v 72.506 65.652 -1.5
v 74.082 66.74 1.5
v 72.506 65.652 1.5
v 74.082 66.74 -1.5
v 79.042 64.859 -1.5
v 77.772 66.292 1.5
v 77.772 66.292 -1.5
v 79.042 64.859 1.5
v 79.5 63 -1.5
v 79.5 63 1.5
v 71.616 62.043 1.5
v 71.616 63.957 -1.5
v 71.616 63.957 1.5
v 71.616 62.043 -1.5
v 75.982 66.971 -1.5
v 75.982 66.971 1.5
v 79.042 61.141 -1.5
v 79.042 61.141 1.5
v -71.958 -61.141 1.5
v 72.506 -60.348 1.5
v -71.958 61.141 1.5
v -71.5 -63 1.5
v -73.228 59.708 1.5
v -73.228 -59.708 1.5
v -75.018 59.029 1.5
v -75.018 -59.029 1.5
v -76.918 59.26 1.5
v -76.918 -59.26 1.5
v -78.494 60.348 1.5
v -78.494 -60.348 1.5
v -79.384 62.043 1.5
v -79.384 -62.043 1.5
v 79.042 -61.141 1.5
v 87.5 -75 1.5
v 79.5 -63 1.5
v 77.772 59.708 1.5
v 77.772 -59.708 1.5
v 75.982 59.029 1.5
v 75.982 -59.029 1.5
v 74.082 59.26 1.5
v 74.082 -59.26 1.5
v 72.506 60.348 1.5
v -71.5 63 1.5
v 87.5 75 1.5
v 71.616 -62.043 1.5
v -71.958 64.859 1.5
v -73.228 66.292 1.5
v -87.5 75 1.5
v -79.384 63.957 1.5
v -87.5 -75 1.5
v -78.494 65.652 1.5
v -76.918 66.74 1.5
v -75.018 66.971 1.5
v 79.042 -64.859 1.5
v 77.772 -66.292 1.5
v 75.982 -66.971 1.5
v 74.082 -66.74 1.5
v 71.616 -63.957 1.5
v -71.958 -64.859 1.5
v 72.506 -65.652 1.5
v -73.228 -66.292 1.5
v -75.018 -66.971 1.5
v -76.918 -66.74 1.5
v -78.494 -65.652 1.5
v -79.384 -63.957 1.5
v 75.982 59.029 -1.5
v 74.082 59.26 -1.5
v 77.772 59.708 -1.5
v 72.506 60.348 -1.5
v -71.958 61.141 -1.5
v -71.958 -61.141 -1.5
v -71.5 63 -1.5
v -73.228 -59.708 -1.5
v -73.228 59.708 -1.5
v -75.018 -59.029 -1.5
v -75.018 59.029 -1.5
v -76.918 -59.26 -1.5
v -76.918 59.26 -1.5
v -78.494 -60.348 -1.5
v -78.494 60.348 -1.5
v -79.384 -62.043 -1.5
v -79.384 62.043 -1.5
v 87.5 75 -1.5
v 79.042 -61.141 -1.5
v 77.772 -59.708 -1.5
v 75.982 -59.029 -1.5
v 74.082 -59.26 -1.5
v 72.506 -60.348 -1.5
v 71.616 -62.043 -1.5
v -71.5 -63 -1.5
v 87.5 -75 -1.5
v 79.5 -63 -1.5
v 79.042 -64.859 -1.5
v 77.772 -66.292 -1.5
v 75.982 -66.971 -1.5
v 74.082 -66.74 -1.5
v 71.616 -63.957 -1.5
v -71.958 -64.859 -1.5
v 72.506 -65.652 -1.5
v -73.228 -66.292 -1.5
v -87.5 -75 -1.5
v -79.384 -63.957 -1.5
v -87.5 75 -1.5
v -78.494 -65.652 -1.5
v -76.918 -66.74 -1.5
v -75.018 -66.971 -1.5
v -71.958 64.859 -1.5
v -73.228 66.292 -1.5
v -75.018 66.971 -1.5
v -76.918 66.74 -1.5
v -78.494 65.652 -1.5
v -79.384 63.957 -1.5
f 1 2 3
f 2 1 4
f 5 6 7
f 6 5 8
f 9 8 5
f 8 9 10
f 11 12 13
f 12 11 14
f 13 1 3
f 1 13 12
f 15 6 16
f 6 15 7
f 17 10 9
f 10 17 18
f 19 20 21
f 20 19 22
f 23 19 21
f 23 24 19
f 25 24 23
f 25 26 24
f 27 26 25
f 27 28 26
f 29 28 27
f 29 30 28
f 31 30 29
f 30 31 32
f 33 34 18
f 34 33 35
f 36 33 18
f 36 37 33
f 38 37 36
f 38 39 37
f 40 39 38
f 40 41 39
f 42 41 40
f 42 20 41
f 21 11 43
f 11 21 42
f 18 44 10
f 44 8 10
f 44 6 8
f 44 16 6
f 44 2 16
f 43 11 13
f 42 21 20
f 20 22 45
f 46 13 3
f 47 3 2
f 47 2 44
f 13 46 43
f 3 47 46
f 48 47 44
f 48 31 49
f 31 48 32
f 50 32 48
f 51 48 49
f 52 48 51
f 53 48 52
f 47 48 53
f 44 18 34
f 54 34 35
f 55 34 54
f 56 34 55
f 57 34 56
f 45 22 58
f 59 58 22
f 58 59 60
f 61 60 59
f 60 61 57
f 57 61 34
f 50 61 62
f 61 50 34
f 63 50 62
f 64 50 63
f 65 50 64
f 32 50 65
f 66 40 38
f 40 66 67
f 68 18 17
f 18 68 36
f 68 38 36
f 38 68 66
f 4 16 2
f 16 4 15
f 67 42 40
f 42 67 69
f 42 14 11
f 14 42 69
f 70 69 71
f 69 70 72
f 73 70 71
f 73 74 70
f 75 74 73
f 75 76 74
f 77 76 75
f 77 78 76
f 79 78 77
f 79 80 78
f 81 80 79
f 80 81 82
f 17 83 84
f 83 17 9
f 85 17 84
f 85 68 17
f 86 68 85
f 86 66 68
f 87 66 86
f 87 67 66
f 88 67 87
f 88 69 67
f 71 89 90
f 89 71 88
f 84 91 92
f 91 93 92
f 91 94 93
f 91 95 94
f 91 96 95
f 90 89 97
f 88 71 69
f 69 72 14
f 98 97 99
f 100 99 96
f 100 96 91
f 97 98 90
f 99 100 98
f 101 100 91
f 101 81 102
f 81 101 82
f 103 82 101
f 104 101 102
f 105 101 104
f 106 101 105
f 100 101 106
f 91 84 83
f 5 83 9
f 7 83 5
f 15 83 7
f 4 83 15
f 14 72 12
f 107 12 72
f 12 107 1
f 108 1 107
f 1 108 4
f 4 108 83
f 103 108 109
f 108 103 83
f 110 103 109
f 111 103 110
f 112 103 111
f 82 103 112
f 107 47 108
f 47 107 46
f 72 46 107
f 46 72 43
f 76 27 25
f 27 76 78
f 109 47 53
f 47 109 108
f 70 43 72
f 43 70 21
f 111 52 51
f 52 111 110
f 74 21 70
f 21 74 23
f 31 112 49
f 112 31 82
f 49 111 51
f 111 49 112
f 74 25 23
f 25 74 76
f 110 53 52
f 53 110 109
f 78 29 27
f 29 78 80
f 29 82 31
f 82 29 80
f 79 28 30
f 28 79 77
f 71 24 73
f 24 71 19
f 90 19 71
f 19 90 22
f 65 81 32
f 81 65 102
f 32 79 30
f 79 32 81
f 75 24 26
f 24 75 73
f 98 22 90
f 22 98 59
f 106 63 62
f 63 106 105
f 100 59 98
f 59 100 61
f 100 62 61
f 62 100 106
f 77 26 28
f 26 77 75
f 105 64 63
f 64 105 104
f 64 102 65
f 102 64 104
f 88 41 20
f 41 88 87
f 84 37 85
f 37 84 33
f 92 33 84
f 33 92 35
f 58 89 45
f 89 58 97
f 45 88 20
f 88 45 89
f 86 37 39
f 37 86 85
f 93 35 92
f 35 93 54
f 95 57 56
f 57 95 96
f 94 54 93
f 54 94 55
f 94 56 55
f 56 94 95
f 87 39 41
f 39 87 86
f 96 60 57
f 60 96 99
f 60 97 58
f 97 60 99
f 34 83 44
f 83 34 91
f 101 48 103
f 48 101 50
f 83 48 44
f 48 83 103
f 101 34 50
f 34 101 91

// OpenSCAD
// Generated by SolidPython 1.1.3 on 2022-12-12 16:11:59


difference() {
	cube(center = true, size = [175, 150, 3]);
	union() {
		translate(v = [75.5000000000, 63.0000000000]) {
			cylinder(center = true, h = 3, r = 4.0000000000);
		}
		translate(v = [-75.5000000000, 63.0000000000]) {
			cylinder(center = true, h = 3, r = 4.0000000000);
		}
		translate(v = [-75.5000000000, -63.0000000000]) {
			cylinder(center = true, h = 3, r = 4.0000000000);
		}
		translate(v = [75.5000000000, -63.0000000000]) {
			cylinder(center = true, h = 3, r = 4.0000000000);
		}
	}
}
/***********************************************
*********      SolidPython code:      **********
************************************************
 
import solid
import pudb
from solid.utils import *
import viewscad
import subprocess
import os
import os.path as osp
import math

chamfer_extrude=solid.import_scad("./chamfer_extrude.scad")
chamfer_extrude=chamfer_extrude.chamfer_extrude
r = viewscad.Renderer(width=800, height=800)

def debug(model,f_name,path="/home/ts/code/projects/mfd/designs/debug"):
    solid.scad_render_to_file(model,osp.join(path,f_name)+".scad")
#generate position list of wells using offset from center
wells_pos_from_center_4 = lambda offset: [[-offset,offset],
                                        [offset, offset],
                                        [-offset, -offset],
                                        [offset, -offset]]
#wells_pos_from_center_2 = lambda offset: [[0,offset],
#                                        [0, -offset]]
wells_pos_from_center_2 = lambda offset: [[offset,0],
                                        [-offset,0]]

def wells_top_bottom(radius,height=None, positions = None, dxf = False):
    if positions is None:
        offset = radius+radius/2.0
        positions = wells_pos_from_center_2(offset)
    if dxf or (height is None):
        height = 0
    wells = []
    for position in positions:
        #make circle if making dxf
        if dxf:
            well_shape = solid.circle(r=radius, segments=64)
            well_shape = solid.translate([position[0],position[1]])(well_shape)
        #if stl make cylinder
        else:
            well_shape = solid.cylinder(r=radius, h=height, segments=64, center = True)
            well_shape = solid.translate([position[0],position[1],height/2.0])(well_shape)
        wells.append(well_shape)
    return  union()(*wells)

#place wells in four corners 
def four_corner(radius,height=None, positions = None, dxf = False):
    #if well pos not specified set
    #to equally spaced by half radius
    if positions is None:
        offset = radius+radius/2.0
        positions = wells_pos_from_center_4(offset)
    if dxf or (height is None):
        height = 0
    #make wells at positions with specified radius and height
    wells = []
    for position in positions:
        #make circle if making dxf
        if dxf:
            well_shape = solid.circle(r=radius, segments=64)
            well_shape = solid.translate([position[0],position[1]])(well_shape)
        #if stl make cylinder
        else:
            well_shape = solid.cylinder(r=radius, h=height, segments=64, center = True)
            well_shape = solid.translate([position[0],position[1],height/2.0])(well_shape)
        wells.append(well_shape)
    return  union()(*wells)

#generate channels 
def make_channels(length,width,height=0,num_chans=1,max_chans=None,spacing=None, dxf = False,
                  rotate_channels=False):
    if dxf or (height is None):
        height = 0
    #if channel gap not defined, is equal to
    if spacing is None: spacing = width
    #calculate number of channels if fitting max num within given width
    if not max_chans is None:
        import math
        num_chans = math.floor((max_chans-spacing)/(width+spacing))
    #get total width of channel section  
    total_width = (width*num_chans)+(spacing*(num_chans-1))

    #make template channel
    #if rotate_channels: width, length = length, width
    if dxf:
        channel_t = solid.square([length,width],center = True)
    else:
        channel_t = solid.cube([length,width,height], center = True)

    #if number channels is even, offset the first channel to center its gap
    if num_chans % 2 == 0: centering = -(width/2.0+spacing/2.0)
    else: centering = 0
    #move template channel up to align bottom at z = 0 
    #and offset center if necessary
    if dxf:
        channel_t = solid.translate([0,centering])(channel_t)
    else:
        channel_t = solid.translate([0,centering,height/2.0])(channel_t)

    #if rotate_channels: length,width = width,length
    #start making the channels
    channels = []
    for i in range(num_chans):
        #if i=0 there is no translation
        #if i=1, we make the first channel adjacent to second
        direction = i

        #if i>=1, we add channels alternating left and right
        if i >= 1:
            direction = -(i/2.0)
            if i % 2 == 1: direction = (-direction)+0.5
                
        #make channel at right position and add it to channel list
        translation_coords = [0,direction*(width+spacing)]
        #if rotate_channels: translation_coords = [direction*(width+spacing),0]
        if dxf:
            channel = solid.translate(translation_coords)(channel_t)
        else:
            channel = solid.translate([*translation_coords,0])(channel_t)
        channels.append(channel)
    
    #group all channels as one object
    channels = union()(*channels)
    #compute the x,y,z dimensions in order to pass as arguments 
    #for construction of other parts of device (such as the chambers)
    measurements = {'x':(length/2.0,-length/2.0),
                    'y':(total_width/2.0,-total_width/2.0)}
    if not dxf:
        measurements['z'] = (height,0)
    if rotate_channels:
        channels = solid.rotate(90)(channels)
        measurements['x'],measurements['y']=measurements['y'],measurements['x']
    return channels,measurements

def make_chambers(msrs,height=None,extra=0,len_until=None,width=None, dxf = False):
    #computes x,y,z length
    total = lambda x : abs(x[0]) + abs(x[1])
    
    #if specific height if specified
    #otherwise use same height as channels
    if dxf:
        pass
    elif not height is None:
        msrs['z'] = (height,0)
    else:
        msrs['z'] = (0,0)
        
    #make copy of measurements from channels to modify chamber dimensions 
    #and add length to chambers as specified
    chamber_dims = msrs.copy()
    #calculate length of chamber to reach specified offset
    if not len_until is None:
        chamber_len = len_until-(msrs['x'][0])
    #or add specified length to channel length (if not specified, adds 0)
    else:
        chamber_len = msrs['x'][0]+extra
    #set the chamber length based 
    chamber_dims['x'] = (chamber_len/2.0,-(chamber_len/2.0))
    #compute final dimensions of chamber
    if not width is None:
        chamber_dims['y'] = (width/2.0,-width/2.0)
    chamber_dims = [total(size) for size in chamber_dims.values()]
        
    #calculate chamber translation offset to place adjacent to channels
    chamber_trslt = msrs['x'][0]+(chamber_len/2.0)
    #compute chamber translation coordinates to align with channels
    #x = 1 moves chamber above channels
    #x = -1 moves chamber below channels
    if dxf:
        trslt = lambda x : [x*(chamber_trslt),0]
    else:
        trslt = lambda x : [x*(chamber_trslt),0,msrs['z'][0]/2.0]
    
    #function to make chamber at top or at bottom 
    if dxf:
        move = lambda x : solid.translate(trslt(x))(solid.square(chamber_dims, center = True) )
    else:
        move = lambda x : solid.translate(trslt(x))(solid.cube(chamber_dims,center = True))
    #make top and bottom chambers and return them as grouped
    top = move(1)
    bottom = move(-1)
    #chambers=solid.rotate(90)(solid.union()(top,bottom))
    chambers=(solid.union()(top,bottom))

    return chambers

#create alignment features 
def alignment_features(unit,dims,grid_size, mask_size = None, alignment = "hollow", units_from_center = (2.5,2.5), corner_len=None):
    width = grid_size[0]*dims[0]
    length = grid_size[1]*dims[1]
    if mask_size is None and corner_len is None:
        corner_len = (dims[0] + dims[1]) /2 / 8
    corner = lambda thickness_div : solid.union()( solid.square([corner_len,corner_len/thickness_div],center=False), solid.square([corner_len/thickness_div,corner_len],center=False) )
    
    def make_full(thickness_div):
        thickness = corner_len/thickness_div
        tr = solid.translate([0, 0, 0 ])(solid.rotate(180)(corner(thickness_div)))
        tr = solid.translate([thickness/2,thickness/2,0])(tr)
        bl = solid.translate([0, 0, 0 ])(solid.rotate(0)(corner(thickness_div)))
        bl = solid.translate([-thickness/2,-thickness/2,0])(bl)
        return solid.union()(tr,bl)
    
    def make_hollow(thickness_div):
        thickness = corner_len/(thickness_div/2)
        inner = make_full(thickness_div)
        outer = make_full(thickness_div/2)
        hollow = outer - inner 
        return hollow
    
    center = (width /2 , length/2)
    mask_pos = lambda x,y : (center[0] + x*(float(units_from_center[0])*dims[0]), center[1] + y*(float(units_from_center[1])*dims[1]))
    positions = []
    positions.append(mask_pos(1,0))
    positions.append(mask_pos(0,1))
    positions.append(mask_pos(-1,0))
    positions.append(mask_pos(0,-1))
    make_mask = lambda mtype : make_hollow(8) if mtype == "hollow" else make_full(8)
    masks = [ solid.translate([*position,0])(make_mask(alignment)) for position in positions]
    
    solid.scad_render_to_file(solid.union()(*masks),"./designs/open_chamber/masks.scad")
    #return unit - solid.union()(*masks)
    return solid.union()(*masks,unit)

def create_outline(thickness, array, dims, grid_size,):
    width = grid_size[0]*dims[0] + thickness *2
    length = grid_size[1]*dims[1] + thickness *2
    outer = solid.translate([-thickness, -thickness,0])(solid.square([width, length]))
    return outer-array

def create_wall(wall_thickness, outline_thickness, dims, grid_size, wall_height = 2000, dxf = False):
    inner_width = grid_size[0]*dims[0] + outline_thickness *2
    inner_length = grid_size[1]*dims[1] + outline_thickness *2
    outer_width = inner_width + wall_thickness * 2
    outer_length = inner_length + wall_thickness * 2
    outer_pos_x = -outline_thickness-wall_thickness
    outer_pos_y = -outline_thickness-wall_thickness
    inner_pos_x = -outline_thickness
    inner_pos_y = -outline_thickness
    if dxf:
        inner_wall = solid.translate([inner_pos_x,
                                      inner_pos_y,
                                      0])(solid.square([inner_width, inner_length]))
        outer_wall = solid.translate([outer_pos_x,
                                      outer_pos_y,
                                      0])(solid.square([outer_width, outer_length]))

        return outer_wall-inner_wall
    else:
        inner_wall = solid.translate([inner_pos_x,
                                      inner_pos_y,
                                      0])(solid.cube([inner_width, inner_length,wall_height]))
        outer_wall = solid.translate([outer_pos_x,
                                      outer_pos_y,
                                      0])(solid.cube([outer_width, outer_length,wall_height]))

        return outer_wall-inner_wall, {'wall_height': wall_height,
                                       'wall_thickness': wall_thickness,
                                       'inner_width':inner_width,
                                       'inner_length': inner_length,
                                       'outer_width': outer_width,
                                       'outer_length': outer_length,
                                       'outer_pos_x' : outer_pos_x,
                                       'outer_pos_y' : outer_pos_y,
                                       'inner_pos_x' : inner_pos_x,
                                       'inner_pos_y' : inner_pos_y}

def create_thicker_wall(wall_thickness, outer_wall_offset, wall_dims, dims, grid_size, height_start = .2, height_end=2, dxf = False):
    addon_wall,thicker_wall_dims = create_wall(wall_thickness, outer_wall_offset, dims, grid_size, wall_height=height_end-height_start, dxf = False)
    addon_wall = solid.translate([0,0,height_start])(addon_wall)

    thicker_wall_dims['wall_height'] = height_end
    thicker_wall_dims['wall_thickness'] = wall_dims['wall_thickness'] + wall_thickness
    return addon_wall, thicker_wall_dims
 
def add_lock_to_wall(wall,wall_dims,y_offset = 0,cut_ratio=0.7,L_length=3, gap_ratio=0.05, axis="x",width_ratio=1/2):
    # Makes L shape
    def make_L(max_length,length_thickness,max_width,width_thickness,height,y_offset):
        length = solid.cube([max_length,length_thickness,height])
        width = solid.cube([width_thickness,max_width,height])
        width = solid.translate([max_length-(width_thickness),0,0])(width)
        L = solid.union()(width,length)
        debug(L,"L")
        if axis == "x":
            L = solid.rotate(-90)(L)
            L = solid.translate([0,max_length,0])(L)
        else:
            L = solid.rotate(-180)(L)
            L = solid.translate([max_length,max_width,0])(L)
        return solid.translate([0,0,y_offset])(L)
    
    lock_length = L_length
    lock_width = wall_dims['wall_thickness']*width_ratio
    lock_length_thickness = lock_width/2
    lock_width_thickness = lock_width/2
    L_lock = make_L(lock_length,lock_length_thickness,lock_width,lock_width_thickness, wall_dims['wall_height']-y_offset, y_offset)
    
    margin_space = lock_length - lock_length*(1-gap_ratio)
    key_length = lock_length-margin_space
    key_length_thickness = lock_length_thickness-(margin_space*2)
    key_width = lock_width-(margin_space*2)
    key_width_thickness = lock_width_thickness-(margin_space*2)
    L_key = make_L(key_length,key_length_thickness,key_width,key_width_thickness, wall_dims['wall_height']-y_offset, y_offset)
    L_key = solid.translate([margin_space,margin_space,0])(L_key)
    L = solid.union()(L_lock,L_key)
    debug(L,"L")
    
    #Make cube to be used as negative to split frame in a half
    #Can choose if making left or right negative, specify ratio of split
    def make_negative(right,cut_ratio):
        if axis == "x":
            if right:
                length = wall_dims['outer_length']*(1-cut_ratio)
                pos_x = wall_dims['outer_pos_x']+(wall_dims['outer_length']*cut_ratio)
            else:
                length = wall_dims['outer_length']*(cut_ratio)
                pos_x = wall_dims['outer_pos_x'] 
            negative = solid.cube([wall_dims['outer_width'],length, wall_dims['wall_height']])
            negative = solid.translate([wall_dims['outer_pos_y'],pos_x,0])(negative)
        else:
            if right:
                length = wall_dims['outer_width']*(1-cut_ratio)
                pos_x = wall_dims['outer_pos_y']+(wall_dims['outer_width']*cut_ratio)
            else:
                length = wall_dims['outer_width']*(cut_ratio)
                pos_x = wall_dims['outer_pos_y'] 
            negative = solid.cube([length,wall_dims['outer_length'], wall_dims['wall_height']])
            negative = solid.translate([pos_x,wall_dims['outer_pos_x'],0])(negative)
        return negative, pos_x, length 
                      
    #Make negatives
    negative_right, right_half_pos_x, right_half_length = make_negative(True,cut_ratio)
    negative_left, left_half_pos_x, right_half_length = make_negative(False,cut_ratio)
    #Make halves
    left_half = solid.difference()(wall,negative_right)
    right_half = solid.difference()(wall,negative_left)
    def place_L(L, L_length,L_width):
        #Place L on top wall       
        offset_to_center = (wall_dims['wall_thickness']-L_width)/2
        if axis == "x":
            y_pos_top = (wall_dims['outer_pos_y'] +
                    wall_dims['outer_width'] - 
                    L_width - offset_to_center)
            top_L = solid.translate([y_pos_top,
                                     right_half_pos_x-(L_length),
                                     0])(L)
            #Place L on bottom wall       
            y_pos_bottom = wall_dims['outer_pos_y']+offset_to_center
            bottom_L = solid.translate([y_pos_bottom,
                                        right_half_pos_x-L_length,
                                        0])(L)
        else:
            y_pos_top = (wall_dims['outer_pos_x'] +
                    wall_dims['outer_length'] -
                    (L_width+offset_to_center))
            top_L = solid.translate([right_half_pos_x-L_length,
                                     y_pos_top,
                                     0])(L)
            #Place L on bottom wall       
            y_pos_bottom = wall_dims['outer_pos_y']+offset_to_center
            bottom_L = solid.translate([right_half_pos_x-L_length,
                                        y_pos_bottom,
                                        0])(L)
        return bottom_L, top_L
    #Make complimentary L pieces through union and differences
    #Make Lock
    bottom_L_lock, top_L_lock = place_L(L_lock,L_length,lock_width)
    left_half = solid.difference()(left_half,bottom_L_lock)
    left_half = solid.difference()(left_half,top_L_lock)
    #Make Key
    bottom_L_key, top_L_key = place_L(L_key,L_length,lock_width)
    right_half = solid.union()(right_half,bottom_L_key)
    right_half = solid.union()(right_half,top_L_key)
    return left_half, right_half


#build a row x col grid of containment units
def make_unit_array(unit,dims,grid_size, dxf = False, alignment = None, mask_size = None,
                    units_from_center = None,alignment_offset=None, alignment_mark_size=1):
    units = []
    for col in range(grid_size[1]):
        for row in range(grid_size[0]):
            if dxf:
                units.append(solid.translate([row*dims[0],col*dims[1]])(unit))
            else:
                units.append(solid.translate([row*dims[0],col*dims[1],dims[2]/2.0])(unit))
    array = solid.union()(*units)
    if (not alignment is None) and dxf:
        if not alignment_offset is None:
            array = solid.translate([alignment_offset[0],alignment_offset[1]])(array)
        array = alignment_features(array,dims, grid_size, alignment = alignment, mask_size = None, units_from_center = units_from_center,corner_len=alignment_mark_size)
        if not alignment_offset is None:
            array = solid.translate([-alignment_offset[0],-alignment_offset[1]])(array)
    return array


def make_taylor(wells_pos = wells_pos_from_center_4(2.25), well_rad = 1.5 ,
                well_height = 2, chan_w = 0.01, chan_l = 1, chan_h = 0.010 ,
                chan_gap = 0.040, max_chans = None,num_chans=100, chamber_height  = 0.100,
                columns = 1, rows = 1, chamber_len_until=2.25, add_channels = True, add_wells = True, 
                add_chambers = True, save_path = "./", alignment = None, units_from_center = 2,
                mask_size = None, render_stl = False, outline_thickness = 0.050, dxf = True,
                wall_height = 15, wall_thickness = 0.95, casing_x=9, casing_y=9, casing_z=0,rotate_units=0):

    dims = [casing_x, casing_y, casing_z]
    wells = four_corner(well_rad,well_height, dxf = dxf, positions = wells_pos)
    debug(wells,"wells")
    channels, msrs = make_channels(chan_l,chan_w,chan_h,dxf=dxf, spacing = chan_gap, max_chans=max_chans,num_chans=num_chans)
    debug(channels,"channels")
    chambers = make_chambers(msrs,dxf = dxf, height=chamber_height,len_until=chamber_len_until)
    debug(chambers,"chambers")

    #add together and render
    device_parts = []
    if add_channels:
        device_parts.append(channels)
    if add_wells:
        device_parts.append(wells)
    if add_chambers:
        device_parts.append(chambers)
    device=union()(*device_parts)
    device = rotate(rotate_units)(device)

    device=solid.translate([dims[0]/2.0,dims[1]/2.0,0])(device)
    channels = rotate(rotate_units)(channels)
    channels=solid.translate([dims[0]/2,dims[1]/2,0])(channels)
    chambers_wells = union()(wells,chambers)
    chambers_wells = rotate(rotate_units)(chambers_wells)
    chambers_wells=solid.translate([dims[0]/2,dims[1]/2,0])(chambers_wells)

    file_name = str(rows)+'x'+str(columns)+'_units_'
    grid_size = [rows,columns]

    if alignment:
        alignment="full"
    device = make_unit_array(device,dims,grid_size, dxf=dxf, alignment = alignment,
                                 units_from_center = units_from_center)
    channels = make_unit_array(channels,dims,grid_size, dxf=dxf, alignment = alignment,
                                 units_from_center = units_from_center)
    if alignment=="full":
        alignment="hollow"

    chambers_wells = make_unit_array(chambers_wells,dims,grid_size, dxf=dxf, alignment = alignment,
                                 units_from_center =units_from_center)

    def save_model(model,prefix):
        model_fname = os.path.abspath(save_path+prefix+"_"+file_name+".scad")
        solid.scad_render_to_file(model,model_fname)
        return model_fname

    wells_fname = save_model(wells,"wells")
    channels_fname = save_model(channels,"channels")
    device_fname = save_model(device,"device")
    chambers_wells_fname = save_model(chambers_wells,"chambers_wells")
    return (chambers_wells,chambers_wells_fname), (channels,channels_fname), (device,device_fname)

def make_device(design='open',rows=8,columns=6,wells_pos = 4.5, well_rad=3.2,well_height=0.1,
                chan_l=1,chan_w=0.01,chan_h=0.01,chan_gap=0.015,num_chans=101,dxf=True,save_path="./designs/open_chamber/",
                casing_x=9.0,casing_y=18.0,casing_z=0,rotate_units=90,units_from_center=(3,1),chamber_len_until=4.5,
                chamber_width=None,alignment=True, add_wells=True, add_channels=True,add_chambers=True):

    dims = [casing_x, casing_y, casing_z]
    if design == "open":
        wells_pos=wells_pos_from_center_2(wells_pos)
        wells = wells_top_bottom(well_rad,height=well_height, dxf = dxf, positions = wells_pos)
    elif design == "closed":
        wells_pos=wells_pos_from_center_4(wells_pos)
        wells = four_corner(well_rad,well_height, dxf = dxf, positions = wells_pos)
    else:
        print(design+" is not a valid design.\n Choose valid design: 'open' or 'closed'")
        exit()
    wells = rotate(rotate_units)(wells)
    wells=solid.translate([dims[0]/2,dims[1]/2,0])(wells)



    channels, msrs = make_channels(chan_l,chan_w,chan_h,dxf=dxf, spacing = chan_gap, num_chans=num_chans,rotate_channels=False)
    channels = rotate(rotate_units)(channels)
    channels=solid.translate([dims[0]/2,dims[1]/2,0])(channels)

    chambers=make_chambers(msrs,height=None,extra=0,len_until=chamber_len_until, width=chamber_width,dxf = dxf)
    chambers = rotate(rotate_units)(chambers)
    chambers=solid.translate([dims[0]/2,dims[1]/2,0])(chambers)

    device_parts = []
    if add_channels:
        device_parts.append(channels)
    if add_wells:
        device_parts.append(wells)
    if add_chambers:
        device_parts.append(chambers)
    device = union()(*device_parts)
    #device = rotate(rotate_units)(device)
    #device=solid.translate([dims[0]/2.0,dims[1]/2.0,0])(device)

    chambers_wells = []
    if add_chambers:
        chambers_wells.append(chambers)
    if add_wells:
        chambers_wells.append(wells)
    chambers_wells = union()(*chambers_wells)
    #chambers_wells = union()(wells,chambers)
    #chambers_wells = rotate(rotate_units)(chambers_wells)
    #chambers_wells=solid.translate([dims[0]/2,dims[1]/2,0])(chambers_wells)

    file_name = str(rows)+'x'+str(columns)+'_units_'

    grid_size = [rows,columns]
    if alignment:
        alignment="full"
    device = make_unit_array(device,dims,grid_size, dxf=dxf, alignment = alignment,
                                 units_from_center = units_from_center)
    channels = make_unit_array(channels,dims,grid_size, dxf=dxf, alignment = alignment,
                                 units_from_center = units_from_center)
    if alignment=="full":
        alignment="hollow"

    chambers_wells = make_unit_array(chambers_wells,dims,grid_size, dxf=dxf, alignment = alignment,
                                 units_from_center =units_from_center)

    def save_model(model,prefix):
        model_fname = os.path.abspath(save_path+prefix+"_"+file_name+".scad")
        solid.scad_render_to_file(model,model_fname)
        return model_fname

    wells_fname = save_model(wells,"wells")
    channels_fname = save_model(channels,"channels")
    device_fname = save_model(device,"device")
    chambers_wells_fname = save_model(chambers_wells,"chambers_wells")
    return (chambers_wells,chambers_wells_fname), (channels,channels_fname), (device,device_fname)


def make_open_chamber(rows=8,columns=6,wells_pos = wells_pos_from_center_2(4.5), well_rad=3.2,well_height=0.1,
                      chan_l=1,chan_w=0.01,chan_h=0.01,chan_gap=0.015,num_chans=101,dxf=True,save_path="./designs/open_chamber/",
                      casing_x=9.0,casing_y=18.0,casing_z=0,rotate_units=90,units_from_center=(3,1),chamber_len_until=4.5,
                      chamber_width=None,alignment=True, add_wells=True, add_channels=True,add_chambers=True):

    dims = [casing_x, casing_y, casing_z]
    wells = wells_top_bottom(well_rad,height=well_height, dxf = dxf, positions = wells_pos)
    channels, msrs = make_channels(chan_l,chan_w,chan_h,dxf=dxf, spacing = chan_gap, num_chans=num_chans,rotate_channels=False)
    chambers=make_chambers(msrs,height=None,extra=0,len_until=chamber_len_until, width=chamber_width,dxf = dxf)
    debug(chambers,"chambers")
    device_parts = []
    if add_channels:
        device_parts.append(channels)
    if add_wells:
        device_parts.append(wells)
    if add_chambers:
        device_parts.append(chambers)
    device = union()(*device_parts)
    device = rotate(rotate_units)(device)
    device=solid.translate([dims[0]/2.0,dims[1]/2.0,0])(device)
    channels = rotate(rotate_units)(channels)
    channels=solid.translate([dims[0]/2,dims[1]/2,0])(channels)
    chambers_wells = union()(wells,chambers)
    chambers_wells = rotate(rotate_units)(chambers_wells)
    chambers_wells=solid.translate([dims[0]/2,dims[1]/2,0])(chambers_wells)

    file_name = str(rows)+'x'+str(columns)+'_units_'

    grid_size = [rows,columns]
    if alignment:
        alignment="full"
    device = make_unit_array(device,dims,grid_size, dxf=dxf, alignment = alignment,
                                 units_from_center = units_from_center)
    channels = make_unit_array(channels,dims,grid_size, dxf=dxf, alignment = alignment,
                                 units_from_center = units_from_center)
    if alignment=="full":
        alignment="hollow"

    chambers_wells = make_unit_array(chambers_wells,dims,grid_size, dxf=dxf, alignment = alignment,
                                 units_from_center =units_from_center)

    def save_model(model,prefix):
        model_fname = os.path.abspath(save_path+prefix+"_"+file_name+".scad")
        solid.scad_render_to_file(model,model_fname)
        return model_fname

    wells_fname = save_model(wells,"wells")
    channels_fname = save_model(channels,"channels")
    device_fname = save_model(device,"device")
    chambers_wells_fname = save_model(chambers_wells,"chambers_wells")
    return (chambers_wells,chambers_wells_fname), (channels,channels_fname), (device,device_fname)

def to_dxf(scad_path):
    dxf_path = scad_path.replace(".scad",".dxf")
    subprocess.call(["openscad", "-o", dxf_path, scad_path])
    import ezdxf
    temp_dxf = ezdxf.readfile(dxf_path)
    temp_dxf.saveas(dxf_path)

#def make_walls(diameter,thickness,grid_size,dims,height=20,segments=256,make_inner=True):
#    wafer_wall_out = solid.cylinder(r=diameter/2,h=height, segments=segments)
#    wafer_wall_in = solid.cylinder(r=(diameter/2-thickness),h=height, segments=segments)
#    wafer_wall = solid.difference()(wafer_wall_out,wafer_wall_in)
#    wafer_wall = solid.translate([grid_size[1]*dims[1]/2.0,grid_size[0]*dims[0]/2.0])(wafer_wall)
#
#    vertical_wall_length = grid_size[1]*dims[1]
#    horizontal_wall_length = grid_size[0]*dims[0]
#    vertical_wall = solid.cube([vertical_wall_length,thickness,height],center = True)
#    vertical_wall = solid.translate([vertical_wall_length/2,0,height/2])(vertical_wall)
#    horizontal_wall = solid.cube([thickness,horizontal_wall_length,height],center = True)
#    horizontal_wall = solid.translate([0,vertical_wall_length/2,height/2])(horizontal_wall)
#    walls = []
#    walls.append(horizontal_wall)
#    walls.append(vertical_wall)
#    for col in range(grid_size[1]):
#        if col == grid_size[1]-1: 
#            walls.append(solid.translate([0,(col+1)*dims[1]])(vertical_wall))
#        elif col > 0 and col < grid_size[1]-1 and make_inner==True:
#            walls.append(solid.translate([0,(col+1)*dims[1]])(vertical_wall))
#    for row in range(grid_size[0]):
#        if row == grid_size[0]-1: 
#            walls.append(solid.translate([(row+1)*dims[0],0])(horizontal_wall))
#        elif row > 0 and row < grid_size[0]-1 and make_inner==True:
#            walls.append(solid.translate([(row+1)*dims[0],0])(horizontal_wall))
#    walls = union()(*walls)
#    wafer_walls = union()(walls,wafer_wall)
#    return walls,wafer_wall,wafer_walls

def make_walls(diameter,thickness,grid_size,dims,height=20,segments=256,make_inner=True,padx=0,pady=0):
    wafer_wall_out = solid.cylinder(r=diameter/2,h=height, segments=segments)
    wafer_wall_in = solid.cylinder(r=(diameter/2-thickness),h=height, segments=segments)
    wafer_wall = solid.difference()(wafer_wall_out,wafer_wall_in)
    wafer_wall = solid.translate([grid_size[1]*dims[1]/2.0,grid_size[0]*dims[0]/2.0])(wafer_wall)

    vertical_wall_length = grid_size[0]*dims[0]+padx
    horizontal_wall_length = grid_size[1]*dims[1]+pady
    vertical_wall = solid.cube([vertical_wall_length,thickness,height],center = True)
    vertical_wall = solid.translate([vertical_wall_length/2-pady/2,-padx/2,height/2])(vertical_wall)
    horizontal_wall = solid.cube([thickness,horizontal_wall_length,height],center = True)
    horizontal_wall = solid.translate([-pady/2,horizontal_wall_length/2-padx/2,height/2])(horizontal_wall)
    walls = []
    walls.append(horizontal_wall)
    walls.append(vertical_wall)
    for col in range(grid_size[1]):
        if col == grid_size[1]-1: 
            walls.append(solid.translate([0,(col+1)*dims[1]+pady])(vertical_wall))
        elif col > 0 and col < grid_size[1]-1 and make_inner==True:
            walls.append(solid.translate([0,(col+1)*dims[1]])(vertical_wall))
    for row in range(grid_size[0]):
        if row == grid_size[0]-1: 
            walls.append(solid.translate([(row+1)*dims[0]+padx,0])(horizontal_wall))
        elif row > 0 and row < grid_size[0]-1 and make_inner==True:
            walls.append(solid.translate([(row+1)*dims[0],0])(horizontal_wall))
    walls = union()(*walls)
    wafer_walls = union()(walls,wafer_wall)
    return walls,wafer_wall,wafer_walls

def save_model(model,base_path,base_name,dxf=True):
    if not os.path.exists(base_path):
        os.makedirs(base_path)
    dxf_path=osp.join(base_path,base_name+".scad")
    solid.scad_render_to_file(model,osp.join(dxf_path))
    if dxf:
        to_dxf(dxf_path)

def make_wafer(diameter,flat_len,thickness):
    wafer = solid.cylinder(r1=diameter/2,r2=diameter/2,h=thickness,segments=512,)()
    x_start_flat=(flat_len/2)
    y_start_flat = math.sqrt(((diameter/2)**2) - (x_start_flat**2) )
    height_delete_flat=diameter/2-y_start_flat
    flat_delete = solid.cube([flat_len,height_delete_flat,thickness],center=False)()
    flat_delete = solid.translate([-flat_len/2,y_start_flat,0])(flat_delete)
    wafer = solid.difference()(wafer,flat_delete)
    wafer = solid.rotate(90)(wafer)
    return wafer

def add_wafer_to_mask(wafer_size,flat_len,mask,grid_size,dims,wafer_line_thickness=0.1,outer_mask_thickness=5,alignment_offset=None):
    def make_wafer_mask(wafer_size,flat_len):
        wafer_mask = make_wafer(wafer_size,flat_len,1)
        wafer_mask = solid.projection()(wafer_mask)
        wafer_mask = solid.translate([grid_size[0]*dims[0]/2.0,grid_size[1]*dims[1]/2.0])(wafer_mask)
        if not alignment_offset is None:
            wafer_mask = solid.translate([-alignment_offset[0],-alignment_offset[1]])(wafer_mask)
        return wafer_mask

    inner_wafer_line_mask = make_wafer_mask(wafer_size-wafer_line_thickness/2,flat_len)
    outer_wafer_line_mask = make_wafer_mask(wafer_size+wafer_line_thickness/2,flat_len)
    outer_wafer_mask = make_wafer_mask(wafer_size+outer_mask_thickness,flat_len)
    outer_wafer_mask = solid.difference()(outer_wafer_mask,outer_wafer_line_mask)
    wafer_mask = solid.union()(outer_wafer_mask,inner_wafer_line_mask)

    return solid.difference()(wafer_mask,mask)

def make_posts(post_shape,post_height):
    posts = solid.linear_extrude(height=post_height)(post_shape)
    return posts

def make_wafer_empty(diameter,flat_len,thickness,margin,notch_len=20,notch_height=5,oversize=1.01):
    diameter*=oversize
    flat_len*=oversize
    wafer = make_wafer(diameter,flat_len,thickness)
    holder = solid.cylinder(r1=diameter/2+margin,r2=diameter/2+margin,h=thickness,segments=512)()
    holder = solid.difference()(holder,wafer)

    x_start_flat=(flat_len/2)
    y_start_flat = math.sqrt(((diameter/2)**2) - (x_start_flat**2) )
    height_delete_flat=diameter/2-y_start_flat
    notch = solid.cube([notch_len,notch_height,thickness],center=False)()
    notch = solid.translate([-notch_len/2,y_start_flat,0])(notch)
    notch = solid.rotate(90)(notch)
    return solid.difference()(holder,notch)

def wafer_print_calibration(diameter,thickness,height,z_offset):
    circles = []
    radii = []
    radii.append(diameter/2.0*0.8)
    radii.append(diameter/2.0*0.6)
    radii.append(diameter/2.0*0.4)
    radii.append(diameter/2.0*0.2)
    for radius in radii:
        inner = solid.cylinder(r1=radius-(thickness/2.0),r2=radius-(thickness/2.0),h=thickness,segments=512,)()
        outer = solid.cylinder(r1=radius+(thickness/2.0),r2=radius+(thickness/2.0),h=thickness,segments=512,)()
        diff = solid.difference()(outer,inner)
        circles.append(diff)
    circles = solid.union()(*circles)
    circles = solid.translate([0,0,z_offset])(circles)
    return circles

def make_rack(wells,dims,grid_size,alignment_offset,rack_x,rack_y,rack_thickness,bolt_width,add_bolts=True):

    #get X and Y dimensions of gride of pipette tips
    X_len = dims[0]*grid_size[0]
    Y_len = dims[1]*grid_size[1]
    #make rack
    rack = solid.cube([rack_x,rack_y,rack_thickness],center=True)

    if add_bolts:
    #add bolt holes
        bolt_hole=solid.cylinder(r=bolt_width/2,h=rack_thickness,center=True)()
        bolt_holes = []
        bolt_holes.append(solid.translate([rack_x/2-1.5*bolt_width,rack_y/2-1.5*bolt_width])(bolt_hole))
        bolt_holes.append(solid.translate([-rack_x/2+1.5*bolt_width,rack_y/2-1.5*bolt_width])(bolt_hole))
        bolt_holes.append(solid.translate([-rack_x/2+1.5*bolt_width,-rack_y/2+1.5*bolt_width])(bolt_hole))
        bolt_holes.append(solid.translate([rack_x/2-1.5*bolt_width,-rack_y/2+1.5*bolt_width])(bolt_hole))
        bolt_holes = solid.union()(*bolt_holes)
        rack=solid.difference()(rack,bolt_holes)
    rack_support = rack

    #center rack with pipette holes
    rack = solid.translate([0,0,rack_thickness/2])(rack)
    rack = solid.translate([X_len/2,Y_len/2])(rack)
    rack = solid.translate([-alignment_offset[0],-alignment_offset[1]])(rack)
    wells = solid.linear_extrude(height=rack_thickness)(wells)
    rack = solid.difference()(rack,wells)
    return rack, rack_support





 
 
************************************************/
